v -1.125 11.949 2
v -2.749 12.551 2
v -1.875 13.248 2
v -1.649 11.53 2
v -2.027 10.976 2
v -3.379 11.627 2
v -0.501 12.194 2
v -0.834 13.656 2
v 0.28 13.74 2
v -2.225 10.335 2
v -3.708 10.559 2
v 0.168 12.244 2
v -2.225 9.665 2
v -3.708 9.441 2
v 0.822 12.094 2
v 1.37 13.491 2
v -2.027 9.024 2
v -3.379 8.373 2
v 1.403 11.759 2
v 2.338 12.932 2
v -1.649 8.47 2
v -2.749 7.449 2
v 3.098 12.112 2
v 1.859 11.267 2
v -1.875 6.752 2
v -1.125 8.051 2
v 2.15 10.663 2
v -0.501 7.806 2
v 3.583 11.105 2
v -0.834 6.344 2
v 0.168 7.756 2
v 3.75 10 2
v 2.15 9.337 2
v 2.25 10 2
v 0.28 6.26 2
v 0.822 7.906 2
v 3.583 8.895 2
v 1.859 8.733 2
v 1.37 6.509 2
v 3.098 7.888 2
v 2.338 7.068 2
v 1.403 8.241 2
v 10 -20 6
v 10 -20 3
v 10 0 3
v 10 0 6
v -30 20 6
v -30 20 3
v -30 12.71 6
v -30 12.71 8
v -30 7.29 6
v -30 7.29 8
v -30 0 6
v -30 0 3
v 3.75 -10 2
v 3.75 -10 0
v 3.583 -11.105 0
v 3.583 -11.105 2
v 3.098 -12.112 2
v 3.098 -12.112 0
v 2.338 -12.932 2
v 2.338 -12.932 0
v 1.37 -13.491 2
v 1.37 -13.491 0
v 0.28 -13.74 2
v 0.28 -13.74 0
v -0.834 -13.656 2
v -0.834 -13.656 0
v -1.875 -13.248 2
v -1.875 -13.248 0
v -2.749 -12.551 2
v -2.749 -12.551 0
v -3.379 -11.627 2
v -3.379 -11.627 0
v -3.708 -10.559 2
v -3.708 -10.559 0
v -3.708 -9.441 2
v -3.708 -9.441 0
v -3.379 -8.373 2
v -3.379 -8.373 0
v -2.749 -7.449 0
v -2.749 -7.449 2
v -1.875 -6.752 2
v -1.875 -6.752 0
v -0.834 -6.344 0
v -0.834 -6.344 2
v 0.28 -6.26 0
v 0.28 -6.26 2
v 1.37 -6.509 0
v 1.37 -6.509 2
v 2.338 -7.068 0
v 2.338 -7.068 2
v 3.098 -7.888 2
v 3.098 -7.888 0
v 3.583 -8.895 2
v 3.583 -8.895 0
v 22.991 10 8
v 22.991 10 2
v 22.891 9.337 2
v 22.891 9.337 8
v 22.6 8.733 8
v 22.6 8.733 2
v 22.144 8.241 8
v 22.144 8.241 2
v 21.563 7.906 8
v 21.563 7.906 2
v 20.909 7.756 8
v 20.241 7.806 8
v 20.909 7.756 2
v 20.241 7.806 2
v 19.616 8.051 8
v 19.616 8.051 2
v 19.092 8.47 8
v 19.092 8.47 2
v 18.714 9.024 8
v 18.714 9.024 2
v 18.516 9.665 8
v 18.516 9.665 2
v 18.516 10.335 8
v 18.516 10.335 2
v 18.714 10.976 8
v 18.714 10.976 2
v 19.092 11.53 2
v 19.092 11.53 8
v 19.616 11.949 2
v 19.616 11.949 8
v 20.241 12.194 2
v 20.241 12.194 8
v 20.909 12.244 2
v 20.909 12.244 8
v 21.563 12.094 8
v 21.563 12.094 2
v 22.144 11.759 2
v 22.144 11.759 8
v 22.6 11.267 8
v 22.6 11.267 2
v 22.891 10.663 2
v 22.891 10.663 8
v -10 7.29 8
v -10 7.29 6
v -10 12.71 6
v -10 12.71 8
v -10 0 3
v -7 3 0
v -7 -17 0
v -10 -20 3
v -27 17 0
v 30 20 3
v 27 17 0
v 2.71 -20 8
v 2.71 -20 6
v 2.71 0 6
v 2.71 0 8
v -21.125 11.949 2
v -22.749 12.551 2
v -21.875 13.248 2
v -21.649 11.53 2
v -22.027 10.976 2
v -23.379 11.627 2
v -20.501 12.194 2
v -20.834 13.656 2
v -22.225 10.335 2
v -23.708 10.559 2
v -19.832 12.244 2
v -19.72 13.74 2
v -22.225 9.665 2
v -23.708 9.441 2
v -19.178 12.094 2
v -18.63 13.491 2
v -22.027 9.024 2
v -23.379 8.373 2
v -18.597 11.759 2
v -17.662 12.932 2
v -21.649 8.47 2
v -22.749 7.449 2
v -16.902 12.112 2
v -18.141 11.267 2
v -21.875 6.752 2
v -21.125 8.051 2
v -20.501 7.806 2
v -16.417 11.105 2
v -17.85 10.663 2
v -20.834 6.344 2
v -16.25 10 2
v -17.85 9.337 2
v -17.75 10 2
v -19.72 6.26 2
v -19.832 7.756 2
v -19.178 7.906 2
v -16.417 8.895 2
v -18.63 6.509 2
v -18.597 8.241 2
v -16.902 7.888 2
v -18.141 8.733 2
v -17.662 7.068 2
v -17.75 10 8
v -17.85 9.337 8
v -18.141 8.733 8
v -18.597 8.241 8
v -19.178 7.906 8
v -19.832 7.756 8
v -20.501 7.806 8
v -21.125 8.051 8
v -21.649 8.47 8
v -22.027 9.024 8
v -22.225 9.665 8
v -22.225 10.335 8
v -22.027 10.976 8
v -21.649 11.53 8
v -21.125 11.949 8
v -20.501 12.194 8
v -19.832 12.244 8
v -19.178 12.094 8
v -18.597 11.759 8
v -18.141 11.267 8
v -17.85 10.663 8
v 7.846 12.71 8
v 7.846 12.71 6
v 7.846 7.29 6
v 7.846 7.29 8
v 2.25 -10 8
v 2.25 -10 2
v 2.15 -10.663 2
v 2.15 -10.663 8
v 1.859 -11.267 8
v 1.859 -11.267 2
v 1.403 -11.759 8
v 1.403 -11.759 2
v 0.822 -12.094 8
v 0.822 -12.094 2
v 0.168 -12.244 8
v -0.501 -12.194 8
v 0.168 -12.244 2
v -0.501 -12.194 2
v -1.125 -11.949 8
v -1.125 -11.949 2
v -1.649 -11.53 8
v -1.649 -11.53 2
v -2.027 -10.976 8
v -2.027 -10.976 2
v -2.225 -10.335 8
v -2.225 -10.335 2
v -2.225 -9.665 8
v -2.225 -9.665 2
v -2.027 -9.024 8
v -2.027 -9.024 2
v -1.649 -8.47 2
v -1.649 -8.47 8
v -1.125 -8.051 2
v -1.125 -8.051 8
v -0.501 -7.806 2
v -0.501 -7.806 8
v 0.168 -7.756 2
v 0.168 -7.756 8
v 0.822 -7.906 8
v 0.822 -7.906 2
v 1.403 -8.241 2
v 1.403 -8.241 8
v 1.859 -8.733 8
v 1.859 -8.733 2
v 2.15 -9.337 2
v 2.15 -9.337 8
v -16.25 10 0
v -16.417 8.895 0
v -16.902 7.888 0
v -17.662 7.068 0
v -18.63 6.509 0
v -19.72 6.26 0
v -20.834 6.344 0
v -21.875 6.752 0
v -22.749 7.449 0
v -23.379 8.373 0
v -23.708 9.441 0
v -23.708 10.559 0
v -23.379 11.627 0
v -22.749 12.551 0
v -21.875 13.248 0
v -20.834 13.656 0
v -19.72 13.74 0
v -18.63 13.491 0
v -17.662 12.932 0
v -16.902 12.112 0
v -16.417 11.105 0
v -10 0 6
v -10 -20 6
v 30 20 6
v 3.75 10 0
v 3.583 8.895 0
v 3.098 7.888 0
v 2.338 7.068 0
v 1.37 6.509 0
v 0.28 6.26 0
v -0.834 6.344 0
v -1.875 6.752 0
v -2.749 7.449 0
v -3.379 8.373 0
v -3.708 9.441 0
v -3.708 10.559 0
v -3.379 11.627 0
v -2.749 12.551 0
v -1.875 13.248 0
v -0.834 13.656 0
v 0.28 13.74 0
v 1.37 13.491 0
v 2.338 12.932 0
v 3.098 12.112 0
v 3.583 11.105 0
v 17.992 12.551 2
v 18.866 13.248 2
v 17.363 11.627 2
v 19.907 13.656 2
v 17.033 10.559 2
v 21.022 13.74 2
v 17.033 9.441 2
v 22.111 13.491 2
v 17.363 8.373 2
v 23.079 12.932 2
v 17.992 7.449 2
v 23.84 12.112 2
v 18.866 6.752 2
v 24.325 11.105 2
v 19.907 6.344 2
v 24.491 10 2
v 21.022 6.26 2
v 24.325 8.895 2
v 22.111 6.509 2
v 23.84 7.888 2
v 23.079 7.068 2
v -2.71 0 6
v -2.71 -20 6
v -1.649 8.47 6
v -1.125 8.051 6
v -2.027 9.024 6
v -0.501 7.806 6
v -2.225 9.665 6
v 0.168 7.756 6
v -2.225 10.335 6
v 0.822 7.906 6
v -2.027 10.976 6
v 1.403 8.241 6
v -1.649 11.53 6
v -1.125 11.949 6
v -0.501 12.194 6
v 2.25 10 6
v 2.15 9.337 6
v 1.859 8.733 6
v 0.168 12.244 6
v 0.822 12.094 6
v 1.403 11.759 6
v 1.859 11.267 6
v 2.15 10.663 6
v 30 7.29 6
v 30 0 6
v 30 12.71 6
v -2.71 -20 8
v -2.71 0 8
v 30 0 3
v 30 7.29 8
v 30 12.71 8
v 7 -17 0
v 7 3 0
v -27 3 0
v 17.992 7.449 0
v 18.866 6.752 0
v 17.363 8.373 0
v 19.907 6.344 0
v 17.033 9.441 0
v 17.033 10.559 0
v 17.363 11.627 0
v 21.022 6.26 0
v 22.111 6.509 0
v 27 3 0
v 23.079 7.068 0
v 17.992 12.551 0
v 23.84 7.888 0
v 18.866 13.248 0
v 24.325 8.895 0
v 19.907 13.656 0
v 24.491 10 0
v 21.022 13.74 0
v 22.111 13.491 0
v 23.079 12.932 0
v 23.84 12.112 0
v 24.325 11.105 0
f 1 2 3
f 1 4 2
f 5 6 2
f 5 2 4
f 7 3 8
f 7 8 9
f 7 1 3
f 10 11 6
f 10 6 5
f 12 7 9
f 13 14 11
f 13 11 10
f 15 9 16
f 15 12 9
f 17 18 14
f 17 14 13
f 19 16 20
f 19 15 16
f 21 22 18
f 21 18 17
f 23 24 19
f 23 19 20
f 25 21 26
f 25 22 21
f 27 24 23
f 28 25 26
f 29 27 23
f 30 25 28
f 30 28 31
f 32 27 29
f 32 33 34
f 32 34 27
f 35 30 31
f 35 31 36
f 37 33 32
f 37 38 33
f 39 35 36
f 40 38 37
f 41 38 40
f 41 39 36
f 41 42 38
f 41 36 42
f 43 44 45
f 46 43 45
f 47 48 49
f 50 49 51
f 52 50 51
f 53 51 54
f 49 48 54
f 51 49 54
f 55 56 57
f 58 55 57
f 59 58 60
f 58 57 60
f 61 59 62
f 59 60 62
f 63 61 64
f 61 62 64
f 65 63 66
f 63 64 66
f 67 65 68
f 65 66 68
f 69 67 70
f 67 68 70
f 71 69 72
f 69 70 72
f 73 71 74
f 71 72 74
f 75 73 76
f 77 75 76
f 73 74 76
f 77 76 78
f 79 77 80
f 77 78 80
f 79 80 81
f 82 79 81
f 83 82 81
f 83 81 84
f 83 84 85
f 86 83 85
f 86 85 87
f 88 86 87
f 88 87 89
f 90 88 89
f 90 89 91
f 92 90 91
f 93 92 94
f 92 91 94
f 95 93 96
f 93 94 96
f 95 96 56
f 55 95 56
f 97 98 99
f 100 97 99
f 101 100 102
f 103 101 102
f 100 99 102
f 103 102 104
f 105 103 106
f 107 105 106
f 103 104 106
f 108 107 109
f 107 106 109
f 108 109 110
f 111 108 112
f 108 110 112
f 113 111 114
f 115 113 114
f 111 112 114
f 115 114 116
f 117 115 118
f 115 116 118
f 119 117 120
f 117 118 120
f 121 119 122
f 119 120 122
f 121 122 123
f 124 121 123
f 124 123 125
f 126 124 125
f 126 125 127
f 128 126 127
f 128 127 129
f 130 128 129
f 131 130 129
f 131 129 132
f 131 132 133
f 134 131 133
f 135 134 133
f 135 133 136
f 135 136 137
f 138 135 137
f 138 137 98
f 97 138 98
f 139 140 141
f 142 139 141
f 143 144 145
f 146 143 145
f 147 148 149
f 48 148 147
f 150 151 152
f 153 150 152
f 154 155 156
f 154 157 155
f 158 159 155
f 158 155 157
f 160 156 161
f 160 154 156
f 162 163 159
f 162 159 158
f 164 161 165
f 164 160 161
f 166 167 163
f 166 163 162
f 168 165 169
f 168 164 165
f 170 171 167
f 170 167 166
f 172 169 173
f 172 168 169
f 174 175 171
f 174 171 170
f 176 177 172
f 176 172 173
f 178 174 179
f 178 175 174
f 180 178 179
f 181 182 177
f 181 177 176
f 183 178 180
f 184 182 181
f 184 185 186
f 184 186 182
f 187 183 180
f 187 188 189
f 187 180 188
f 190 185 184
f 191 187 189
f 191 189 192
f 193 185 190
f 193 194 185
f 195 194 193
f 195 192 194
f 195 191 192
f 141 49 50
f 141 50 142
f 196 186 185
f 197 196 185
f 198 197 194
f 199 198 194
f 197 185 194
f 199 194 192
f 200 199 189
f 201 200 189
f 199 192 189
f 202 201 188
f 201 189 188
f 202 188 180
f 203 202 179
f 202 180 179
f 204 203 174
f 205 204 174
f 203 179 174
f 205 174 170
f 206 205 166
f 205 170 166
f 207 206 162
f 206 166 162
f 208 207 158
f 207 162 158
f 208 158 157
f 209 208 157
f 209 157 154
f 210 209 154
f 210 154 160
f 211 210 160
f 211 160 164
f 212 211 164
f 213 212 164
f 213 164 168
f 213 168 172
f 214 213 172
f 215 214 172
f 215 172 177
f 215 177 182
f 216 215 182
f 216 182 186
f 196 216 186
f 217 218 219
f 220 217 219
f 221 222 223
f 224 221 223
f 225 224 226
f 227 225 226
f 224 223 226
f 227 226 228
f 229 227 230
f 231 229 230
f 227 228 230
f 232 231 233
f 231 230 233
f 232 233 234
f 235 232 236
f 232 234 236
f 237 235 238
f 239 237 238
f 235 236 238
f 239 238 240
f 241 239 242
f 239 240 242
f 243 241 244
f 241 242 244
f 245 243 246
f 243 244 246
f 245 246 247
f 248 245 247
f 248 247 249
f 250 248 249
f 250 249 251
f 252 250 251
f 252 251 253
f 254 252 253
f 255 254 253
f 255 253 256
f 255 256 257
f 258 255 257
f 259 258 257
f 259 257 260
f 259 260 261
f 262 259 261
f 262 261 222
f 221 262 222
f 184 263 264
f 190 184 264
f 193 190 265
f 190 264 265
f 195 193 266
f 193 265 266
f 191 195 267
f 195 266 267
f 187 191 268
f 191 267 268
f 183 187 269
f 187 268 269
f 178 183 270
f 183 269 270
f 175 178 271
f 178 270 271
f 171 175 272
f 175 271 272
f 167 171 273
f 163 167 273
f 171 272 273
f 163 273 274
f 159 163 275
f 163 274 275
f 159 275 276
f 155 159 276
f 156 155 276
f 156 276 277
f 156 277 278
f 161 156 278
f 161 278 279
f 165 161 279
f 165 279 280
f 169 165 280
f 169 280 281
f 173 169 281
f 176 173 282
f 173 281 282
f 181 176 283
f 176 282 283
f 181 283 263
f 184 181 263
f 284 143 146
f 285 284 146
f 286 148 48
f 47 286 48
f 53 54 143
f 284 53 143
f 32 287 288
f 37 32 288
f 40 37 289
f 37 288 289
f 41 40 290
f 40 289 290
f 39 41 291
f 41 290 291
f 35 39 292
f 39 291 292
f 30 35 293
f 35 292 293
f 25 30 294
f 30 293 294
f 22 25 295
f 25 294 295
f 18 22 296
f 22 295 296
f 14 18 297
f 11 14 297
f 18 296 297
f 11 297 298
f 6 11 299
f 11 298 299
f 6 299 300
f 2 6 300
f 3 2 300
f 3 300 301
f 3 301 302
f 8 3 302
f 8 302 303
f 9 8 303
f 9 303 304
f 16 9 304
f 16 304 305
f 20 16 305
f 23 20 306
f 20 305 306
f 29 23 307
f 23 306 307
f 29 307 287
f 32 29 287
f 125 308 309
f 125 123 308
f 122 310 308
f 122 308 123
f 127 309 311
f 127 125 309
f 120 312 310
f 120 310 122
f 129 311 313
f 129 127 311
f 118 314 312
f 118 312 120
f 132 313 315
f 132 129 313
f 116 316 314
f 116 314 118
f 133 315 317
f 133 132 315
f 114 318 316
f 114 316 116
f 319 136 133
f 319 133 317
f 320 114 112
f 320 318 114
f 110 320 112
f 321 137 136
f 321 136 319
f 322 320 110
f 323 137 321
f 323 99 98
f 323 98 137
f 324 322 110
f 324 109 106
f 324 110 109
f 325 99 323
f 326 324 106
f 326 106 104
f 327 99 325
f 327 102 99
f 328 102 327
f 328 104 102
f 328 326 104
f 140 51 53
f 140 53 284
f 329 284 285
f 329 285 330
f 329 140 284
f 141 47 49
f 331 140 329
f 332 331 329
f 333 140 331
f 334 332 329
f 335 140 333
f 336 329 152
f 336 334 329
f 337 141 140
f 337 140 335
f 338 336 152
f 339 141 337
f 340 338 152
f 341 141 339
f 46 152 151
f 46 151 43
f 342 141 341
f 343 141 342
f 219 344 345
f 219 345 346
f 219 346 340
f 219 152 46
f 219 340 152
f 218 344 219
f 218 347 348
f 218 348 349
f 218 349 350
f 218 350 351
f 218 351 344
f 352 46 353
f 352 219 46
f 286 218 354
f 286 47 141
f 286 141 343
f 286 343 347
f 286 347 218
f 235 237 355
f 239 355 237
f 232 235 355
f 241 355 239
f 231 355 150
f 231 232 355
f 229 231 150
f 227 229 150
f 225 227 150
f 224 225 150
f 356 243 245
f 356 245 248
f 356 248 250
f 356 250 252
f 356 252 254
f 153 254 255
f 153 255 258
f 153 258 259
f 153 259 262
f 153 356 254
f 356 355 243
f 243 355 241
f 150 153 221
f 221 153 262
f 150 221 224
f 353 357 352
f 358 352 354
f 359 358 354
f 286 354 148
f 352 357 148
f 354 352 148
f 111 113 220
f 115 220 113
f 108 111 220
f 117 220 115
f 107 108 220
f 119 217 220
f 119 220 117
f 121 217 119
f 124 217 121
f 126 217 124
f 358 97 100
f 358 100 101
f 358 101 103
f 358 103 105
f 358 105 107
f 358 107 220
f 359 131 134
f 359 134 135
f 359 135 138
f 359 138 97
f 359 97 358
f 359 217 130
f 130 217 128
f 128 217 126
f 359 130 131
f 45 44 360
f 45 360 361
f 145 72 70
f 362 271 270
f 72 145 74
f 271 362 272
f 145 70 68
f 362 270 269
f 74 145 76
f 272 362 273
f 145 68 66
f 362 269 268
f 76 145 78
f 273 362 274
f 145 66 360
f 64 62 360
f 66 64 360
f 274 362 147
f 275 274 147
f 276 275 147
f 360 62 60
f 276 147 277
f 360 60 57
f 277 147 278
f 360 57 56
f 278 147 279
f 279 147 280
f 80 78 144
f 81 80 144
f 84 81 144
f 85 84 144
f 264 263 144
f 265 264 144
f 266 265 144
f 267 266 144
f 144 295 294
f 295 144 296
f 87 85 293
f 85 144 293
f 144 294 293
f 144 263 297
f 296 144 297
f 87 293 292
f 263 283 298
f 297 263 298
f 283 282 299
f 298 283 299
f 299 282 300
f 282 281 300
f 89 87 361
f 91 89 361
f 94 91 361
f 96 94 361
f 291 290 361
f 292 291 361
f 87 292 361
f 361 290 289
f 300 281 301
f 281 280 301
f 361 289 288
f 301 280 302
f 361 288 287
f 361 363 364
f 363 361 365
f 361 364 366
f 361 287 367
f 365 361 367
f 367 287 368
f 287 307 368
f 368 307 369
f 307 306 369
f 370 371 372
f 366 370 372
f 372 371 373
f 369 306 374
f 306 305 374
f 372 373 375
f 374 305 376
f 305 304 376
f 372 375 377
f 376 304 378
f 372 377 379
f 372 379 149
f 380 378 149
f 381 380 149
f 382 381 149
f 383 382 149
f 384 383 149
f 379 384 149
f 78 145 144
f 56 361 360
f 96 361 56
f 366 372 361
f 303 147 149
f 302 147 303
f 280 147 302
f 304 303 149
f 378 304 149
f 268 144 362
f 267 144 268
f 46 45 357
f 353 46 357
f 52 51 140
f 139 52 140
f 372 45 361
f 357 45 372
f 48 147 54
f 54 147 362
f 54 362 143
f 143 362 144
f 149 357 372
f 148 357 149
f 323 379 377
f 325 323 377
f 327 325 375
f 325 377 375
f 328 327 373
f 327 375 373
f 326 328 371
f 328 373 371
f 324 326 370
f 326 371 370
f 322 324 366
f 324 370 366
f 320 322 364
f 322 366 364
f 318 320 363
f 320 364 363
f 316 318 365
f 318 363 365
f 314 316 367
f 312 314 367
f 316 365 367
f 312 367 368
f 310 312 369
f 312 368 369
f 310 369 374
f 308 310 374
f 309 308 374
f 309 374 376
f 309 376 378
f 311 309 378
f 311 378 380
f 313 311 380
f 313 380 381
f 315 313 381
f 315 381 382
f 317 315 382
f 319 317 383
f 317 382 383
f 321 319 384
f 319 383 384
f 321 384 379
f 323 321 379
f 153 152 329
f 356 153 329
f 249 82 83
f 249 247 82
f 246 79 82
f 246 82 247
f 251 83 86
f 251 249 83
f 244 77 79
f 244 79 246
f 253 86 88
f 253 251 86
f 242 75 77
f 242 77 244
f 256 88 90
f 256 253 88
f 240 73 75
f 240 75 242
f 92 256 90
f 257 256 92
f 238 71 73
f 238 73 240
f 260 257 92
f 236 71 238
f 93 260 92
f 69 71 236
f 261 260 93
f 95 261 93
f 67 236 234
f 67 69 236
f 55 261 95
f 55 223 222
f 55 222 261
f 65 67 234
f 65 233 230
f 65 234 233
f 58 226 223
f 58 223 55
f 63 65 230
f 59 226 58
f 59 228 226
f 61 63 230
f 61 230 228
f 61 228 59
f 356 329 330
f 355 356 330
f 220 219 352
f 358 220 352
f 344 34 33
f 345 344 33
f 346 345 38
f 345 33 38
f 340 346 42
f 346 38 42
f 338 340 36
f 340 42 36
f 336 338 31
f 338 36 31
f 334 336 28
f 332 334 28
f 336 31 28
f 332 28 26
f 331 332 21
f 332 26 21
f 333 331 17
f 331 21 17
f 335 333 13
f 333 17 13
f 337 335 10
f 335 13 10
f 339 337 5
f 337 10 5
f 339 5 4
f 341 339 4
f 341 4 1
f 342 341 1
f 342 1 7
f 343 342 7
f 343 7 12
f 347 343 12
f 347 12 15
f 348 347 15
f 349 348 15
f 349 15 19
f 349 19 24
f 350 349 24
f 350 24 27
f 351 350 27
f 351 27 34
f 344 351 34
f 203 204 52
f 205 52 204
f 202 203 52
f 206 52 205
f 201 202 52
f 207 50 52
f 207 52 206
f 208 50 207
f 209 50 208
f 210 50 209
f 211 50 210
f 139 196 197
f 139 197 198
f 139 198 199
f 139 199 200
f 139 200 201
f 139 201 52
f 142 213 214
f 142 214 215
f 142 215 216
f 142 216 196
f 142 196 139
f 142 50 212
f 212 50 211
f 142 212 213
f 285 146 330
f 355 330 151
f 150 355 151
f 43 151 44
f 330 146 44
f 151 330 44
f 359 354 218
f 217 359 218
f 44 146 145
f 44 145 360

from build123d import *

# Parameters (mm, degrees)
F1_DEPTH = 6
F2_W     = 20
F2_H     = 5.42
F3_DEPTH = 2
F4_R     = 2.25
F5_DEPTH = 8.001
F6_R     = 3.75
F7_DEPTH = 2
F8_SIZE  = 3


with BuildPart() as f1:
    # F0 (on Top) → F1 (new body)
    with BuildSketch(Plane.XY):
        Polygon((-30, 0), (-10, 0), (-10, -20), (0, -20), (10, -20), (10, 0), (30, 0), (30, 20), (0, 20), (-30, 20), align=None)
    extrude(amount=F1_DEPTH)

    # F2 (on face) → F3 (join)
    with BuildSketch(Plane.XY.offset(6)):
        Polygon((2.71, 0), (0, 0), (-2.71, 0), (-2.71, -20), (2.71, -20), align=None)
        Polygon((7.845558, 12.71), (7.845558, 10), (7.845558, 7.29), (30, 7.29), (30, 12.71), align=None)
        with Locations((-20, 10)):
            Rectangle(F2_W, F2_H)
    extrude(amount=F3_DEPTH)

    # F4 (on face) → F5 (cut, through all)
    with BuildSketch(Plane(origin=(0, 0, 0), x_dir=(1, 0, 0), z_dir=(0, 0, -1))):
        with Locations((-20, -10)):
            Circle(F4_R)
        with Locations((0, -10)):
            Circle(F4_R)
        with Locations((0, 10)):
            Circle(F4_R)
        with Locations((20.741304, -10)):
            Circle(F4_R)
    extrude(amount=-F5_DEPTH, mode=Mode.SUBTRACT)

    # F6 (on face) → F7 (cut)
    with BuildSketch(Plane(origin=(0, 0, 0), x_dir=(1, 0, 0), z_dir=(0, 0, -1))):
        with Locations((0, 10)):
            Circle(F6_R)
        with Locations((0, -10)):
            Circle(F6_R)
        with Locations((20.741304, -10)):
            Circle(F6_R)
        with Locations((-20, -10)):
            Circle(F6_R)
    extrude(amount=-F7_DEPTH, mode=Mode.SUBTRACT)

    # F8
    f8_edges = [f1.edges().sort_by_distance(p)[0] for p in [
        (-10, -10, 0),
        (-20, 0, 0),
        (10, -10, 0),
        (20, 0, 0),
        (0, 20, 0),
        (30, 10, 0),
        (-30, 10, 0),
        (0, -20, 0),
    ]]
    chamfer(f8_edges, length=F8_SIZE)


solid = f1.part
